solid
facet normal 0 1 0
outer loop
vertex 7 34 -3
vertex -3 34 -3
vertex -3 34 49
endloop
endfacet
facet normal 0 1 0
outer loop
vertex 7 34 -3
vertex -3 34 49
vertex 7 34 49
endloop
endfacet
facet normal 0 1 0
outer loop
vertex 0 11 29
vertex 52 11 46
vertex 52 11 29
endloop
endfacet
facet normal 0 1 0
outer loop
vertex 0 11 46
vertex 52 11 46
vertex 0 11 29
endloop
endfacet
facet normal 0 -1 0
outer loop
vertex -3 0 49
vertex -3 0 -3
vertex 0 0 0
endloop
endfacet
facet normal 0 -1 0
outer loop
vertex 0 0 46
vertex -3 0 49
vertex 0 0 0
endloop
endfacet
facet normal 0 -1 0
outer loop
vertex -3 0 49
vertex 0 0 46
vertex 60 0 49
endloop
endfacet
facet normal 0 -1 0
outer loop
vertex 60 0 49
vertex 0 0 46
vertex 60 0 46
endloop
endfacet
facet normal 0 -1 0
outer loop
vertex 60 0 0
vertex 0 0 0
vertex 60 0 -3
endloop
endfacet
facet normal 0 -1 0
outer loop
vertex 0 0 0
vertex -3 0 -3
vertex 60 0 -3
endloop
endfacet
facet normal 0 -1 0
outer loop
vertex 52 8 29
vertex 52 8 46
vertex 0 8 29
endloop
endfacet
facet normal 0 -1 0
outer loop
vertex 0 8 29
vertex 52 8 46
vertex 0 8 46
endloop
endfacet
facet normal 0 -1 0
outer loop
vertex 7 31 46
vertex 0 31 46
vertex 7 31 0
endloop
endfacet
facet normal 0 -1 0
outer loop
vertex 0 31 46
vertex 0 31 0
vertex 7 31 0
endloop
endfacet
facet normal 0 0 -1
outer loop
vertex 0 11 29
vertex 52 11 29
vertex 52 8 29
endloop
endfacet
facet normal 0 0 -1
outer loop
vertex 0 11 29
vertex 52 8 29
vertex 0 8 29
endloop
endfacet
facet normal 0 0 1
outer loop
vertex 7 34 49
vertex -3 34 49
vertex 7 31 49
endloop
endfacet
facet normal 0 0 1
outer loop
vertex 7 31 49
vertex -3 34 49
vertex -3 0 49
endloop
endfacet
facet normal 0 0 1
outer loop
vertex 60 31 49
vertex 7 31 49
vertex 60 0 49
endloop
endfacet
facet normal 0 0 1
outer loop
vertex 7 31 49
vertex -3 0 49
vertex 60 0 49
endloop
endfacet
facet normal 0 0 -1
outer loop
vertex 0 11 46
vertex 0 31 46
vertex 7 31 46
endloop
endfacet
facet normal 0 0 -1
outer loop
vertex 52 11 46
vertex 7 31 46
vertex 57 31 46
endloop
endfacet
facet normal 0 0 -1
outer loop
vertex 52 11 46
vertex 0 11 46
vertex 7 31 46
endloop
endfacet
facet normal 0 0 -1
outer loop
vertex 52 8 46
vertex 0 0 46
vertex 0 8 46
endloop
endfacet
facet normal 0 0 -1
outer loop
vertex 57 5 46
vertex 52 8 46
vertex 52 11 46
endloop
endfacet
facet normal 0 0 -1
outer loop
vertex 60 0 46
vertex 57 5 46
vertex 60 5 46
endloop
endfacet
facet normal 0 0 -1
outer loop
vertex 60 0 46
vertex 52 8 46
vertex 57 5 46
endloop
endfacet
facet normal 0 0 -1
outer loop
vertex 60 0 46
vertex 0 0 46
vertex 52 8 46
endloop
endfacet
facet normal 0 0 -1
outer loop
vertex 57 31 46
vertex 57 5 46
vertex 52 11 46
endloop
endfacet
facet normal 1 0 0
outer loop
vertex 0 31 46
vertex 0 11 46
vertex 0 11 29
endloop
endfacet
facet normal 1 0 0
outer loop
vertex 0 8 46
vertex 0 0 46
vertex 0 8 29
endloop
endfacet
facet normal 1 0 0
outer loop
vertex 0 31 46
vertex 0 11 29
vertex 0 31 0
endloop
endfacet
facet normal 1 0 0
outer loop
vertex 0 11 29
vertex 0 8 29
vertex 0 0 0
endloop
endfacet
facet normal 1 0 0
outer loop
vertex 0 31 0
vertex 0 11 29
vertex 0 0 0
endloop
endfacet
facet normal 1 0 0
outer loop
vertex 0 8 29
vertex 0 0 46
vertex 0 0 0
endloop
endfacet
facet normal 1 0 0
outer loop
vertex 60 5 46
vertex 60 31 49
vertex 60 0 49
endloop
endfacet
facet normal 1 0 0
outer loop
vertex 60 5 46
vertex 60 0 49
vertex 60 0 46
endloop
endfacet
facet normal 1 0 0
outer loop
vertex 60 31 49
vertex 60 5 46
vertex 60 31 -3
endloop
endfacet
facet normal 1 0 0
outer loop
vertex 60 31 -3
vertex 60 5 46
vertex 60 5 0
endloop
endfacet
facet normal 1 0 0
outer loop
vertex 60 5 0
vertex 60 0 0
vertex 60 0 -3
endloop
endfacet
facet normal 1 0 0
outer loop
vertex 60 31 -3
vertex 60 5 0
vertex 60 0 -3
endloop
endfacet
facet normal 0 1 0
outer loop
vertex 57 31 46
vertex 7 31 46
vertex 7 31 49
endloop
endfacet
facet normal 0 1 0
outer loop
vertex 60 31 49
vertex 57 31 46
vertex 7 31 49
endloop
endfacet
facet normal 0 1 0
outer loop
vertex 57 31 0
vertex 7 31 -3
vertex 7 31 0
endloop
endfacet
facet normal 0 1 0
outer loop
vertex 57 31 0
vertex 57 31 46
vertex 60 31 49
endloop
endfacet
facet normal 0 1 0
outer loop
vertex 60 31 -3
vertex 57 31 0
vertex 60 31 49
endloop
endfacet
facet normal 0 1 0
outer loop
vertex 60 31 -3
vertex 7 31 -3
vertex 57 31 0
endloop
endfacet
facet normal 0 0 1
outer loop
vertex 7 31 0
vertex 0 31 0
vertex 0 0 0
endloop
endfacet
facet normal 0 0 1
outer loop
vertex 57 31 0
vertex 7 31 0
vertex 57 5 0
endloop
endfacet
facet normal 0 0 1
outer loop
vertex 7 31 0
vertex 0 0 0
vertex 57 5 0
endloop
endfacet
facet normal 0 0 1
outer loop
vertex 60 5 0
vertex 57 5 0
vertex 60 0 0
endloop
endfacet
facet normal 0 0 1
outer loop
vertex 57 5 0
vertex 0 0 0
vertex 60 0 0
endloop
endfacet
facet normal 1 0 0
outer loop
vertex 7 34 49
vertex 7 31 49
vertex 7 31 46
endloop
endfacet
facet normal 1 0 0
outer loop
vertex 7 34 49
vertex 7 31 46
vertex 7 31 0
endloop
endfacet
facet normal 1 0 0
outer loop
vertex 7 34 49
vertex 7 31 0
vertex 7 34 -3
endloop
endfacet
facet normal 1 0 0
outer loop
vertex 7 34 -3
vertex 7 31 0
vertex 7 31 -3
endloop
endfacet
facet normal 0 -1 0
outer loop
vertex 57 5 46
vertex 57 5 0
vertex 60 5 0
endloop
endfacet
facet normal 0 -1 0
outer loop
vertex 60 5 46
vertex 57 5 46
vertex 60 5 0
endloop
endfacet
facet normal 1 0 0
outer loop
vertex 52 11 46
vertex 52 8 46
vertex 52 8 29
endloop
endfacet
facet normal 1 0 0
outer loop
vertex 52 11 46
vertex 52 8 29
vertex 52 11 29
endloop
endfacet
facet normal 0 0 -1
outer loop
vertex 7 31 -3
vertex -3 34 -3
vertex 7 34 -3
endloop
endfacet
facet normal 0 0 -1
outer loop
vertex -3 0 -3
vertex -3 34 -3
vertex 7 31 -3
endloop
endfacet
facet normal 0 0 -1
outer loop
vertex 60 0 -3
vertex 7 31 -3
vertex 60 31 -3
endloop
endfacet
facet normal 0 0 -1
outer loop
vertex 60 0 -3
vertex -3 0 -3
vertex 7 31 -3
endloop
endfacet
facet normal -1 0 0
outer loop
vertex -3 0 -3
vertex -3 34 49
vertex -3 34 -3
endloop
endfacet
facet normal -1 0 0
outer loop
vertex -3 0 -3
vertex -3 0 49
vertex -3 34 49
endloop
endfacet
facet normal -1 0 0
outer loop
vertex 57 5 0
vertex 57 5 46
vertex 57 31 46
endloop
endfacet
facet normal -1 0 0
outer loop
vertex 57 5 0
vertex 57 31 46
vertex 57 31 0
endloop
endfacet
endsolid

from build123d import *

# Parameters (mm, degrees)
SKETCH2_W           = 63
SKETCH2_H           = 52
BOSS_EXTRUDE1_DEPTH = 31
SKETCH1_W           = 57
SKETCH1_H           = 46
CUT_EXTRUDE1_DEPTH  = 31
SKETCH3_W           = 3
SKETCH3_H           = 46
CUT_EXTRUDE2_DEPTH  = 5
SKETCH4_W           = 52
SKETCH4_H           = 3
BOSS_EXTRUDE2_DEPTH = 17
SKETCH5_W           = 10
SKETCH5_H           = 52
BOSS_EXTRUDE3_DEPTH = 3


with BuildPart() as part:
    # Sketch2 → Boss-Extrude1 (new body)
    with BuildSketch(Plane(origin=(0, 0, 0), x_dir=(1, 0, 0), z_dir=(0, 1, 0))):
        with Locations((28.5, -23)):
            Rectangle(SKETCH2_W, SKETCH2_H)
    extrude(amount=BOSS_EXTRUDE1_DEPTH)

    # Sketch1 → Cut-Extrude1 (cut)
    with BuildSketch(Plane(origin=(0, 0, 0), x_dir=(1, 0, 0), z_dir=(0, 1, 0))):
        with Locations((28.5, -23)):
            Rectangle(SKETCH1_W, SKETCH1_H)
    extrude(amount=CUT_EXTRUDE1_DEPTH, mode=Mode.SUBTRACT)

    # Sketch3 → Cut-Extrude2 (cut)
    with BuildSketch(Plane.XZ):
        with Locations((58.5, 23)):
            Rectangle(SKETCH3_W, SKETCH3_H)
    extrude(amount=-CUT_EXTRUDE2_DEPTH, mode=Mode.SUBTRACT)

    # Sketch4 → Boss-Extrude2 (add)
    with BuildSketch(Plane(origin=(0, 0, 46), x_dir=(-1, 0, 0), z_dir=(0, 0, -1))):
        with Locations((-26, 9.5)):
            Rectangle(SKETCH4_W, SKETCH4_H)
    extrude(amount=BOSS_EXTRUDE2_DEPTH)

    # Sketch5 → Boss-Extrude3 (add)
    with BuildSketch(Plane(origin=(0, 31, 0), x_dir=(1, 0, 0), z_dir=(0, 1, 0))):
        with Locations((2, -23)):
            Rectangle(SKETCH5_W, SKETCH5_H)
    extrude(amount=BOSS_EXTRUDE3_DEPTH)


solid = part.part
